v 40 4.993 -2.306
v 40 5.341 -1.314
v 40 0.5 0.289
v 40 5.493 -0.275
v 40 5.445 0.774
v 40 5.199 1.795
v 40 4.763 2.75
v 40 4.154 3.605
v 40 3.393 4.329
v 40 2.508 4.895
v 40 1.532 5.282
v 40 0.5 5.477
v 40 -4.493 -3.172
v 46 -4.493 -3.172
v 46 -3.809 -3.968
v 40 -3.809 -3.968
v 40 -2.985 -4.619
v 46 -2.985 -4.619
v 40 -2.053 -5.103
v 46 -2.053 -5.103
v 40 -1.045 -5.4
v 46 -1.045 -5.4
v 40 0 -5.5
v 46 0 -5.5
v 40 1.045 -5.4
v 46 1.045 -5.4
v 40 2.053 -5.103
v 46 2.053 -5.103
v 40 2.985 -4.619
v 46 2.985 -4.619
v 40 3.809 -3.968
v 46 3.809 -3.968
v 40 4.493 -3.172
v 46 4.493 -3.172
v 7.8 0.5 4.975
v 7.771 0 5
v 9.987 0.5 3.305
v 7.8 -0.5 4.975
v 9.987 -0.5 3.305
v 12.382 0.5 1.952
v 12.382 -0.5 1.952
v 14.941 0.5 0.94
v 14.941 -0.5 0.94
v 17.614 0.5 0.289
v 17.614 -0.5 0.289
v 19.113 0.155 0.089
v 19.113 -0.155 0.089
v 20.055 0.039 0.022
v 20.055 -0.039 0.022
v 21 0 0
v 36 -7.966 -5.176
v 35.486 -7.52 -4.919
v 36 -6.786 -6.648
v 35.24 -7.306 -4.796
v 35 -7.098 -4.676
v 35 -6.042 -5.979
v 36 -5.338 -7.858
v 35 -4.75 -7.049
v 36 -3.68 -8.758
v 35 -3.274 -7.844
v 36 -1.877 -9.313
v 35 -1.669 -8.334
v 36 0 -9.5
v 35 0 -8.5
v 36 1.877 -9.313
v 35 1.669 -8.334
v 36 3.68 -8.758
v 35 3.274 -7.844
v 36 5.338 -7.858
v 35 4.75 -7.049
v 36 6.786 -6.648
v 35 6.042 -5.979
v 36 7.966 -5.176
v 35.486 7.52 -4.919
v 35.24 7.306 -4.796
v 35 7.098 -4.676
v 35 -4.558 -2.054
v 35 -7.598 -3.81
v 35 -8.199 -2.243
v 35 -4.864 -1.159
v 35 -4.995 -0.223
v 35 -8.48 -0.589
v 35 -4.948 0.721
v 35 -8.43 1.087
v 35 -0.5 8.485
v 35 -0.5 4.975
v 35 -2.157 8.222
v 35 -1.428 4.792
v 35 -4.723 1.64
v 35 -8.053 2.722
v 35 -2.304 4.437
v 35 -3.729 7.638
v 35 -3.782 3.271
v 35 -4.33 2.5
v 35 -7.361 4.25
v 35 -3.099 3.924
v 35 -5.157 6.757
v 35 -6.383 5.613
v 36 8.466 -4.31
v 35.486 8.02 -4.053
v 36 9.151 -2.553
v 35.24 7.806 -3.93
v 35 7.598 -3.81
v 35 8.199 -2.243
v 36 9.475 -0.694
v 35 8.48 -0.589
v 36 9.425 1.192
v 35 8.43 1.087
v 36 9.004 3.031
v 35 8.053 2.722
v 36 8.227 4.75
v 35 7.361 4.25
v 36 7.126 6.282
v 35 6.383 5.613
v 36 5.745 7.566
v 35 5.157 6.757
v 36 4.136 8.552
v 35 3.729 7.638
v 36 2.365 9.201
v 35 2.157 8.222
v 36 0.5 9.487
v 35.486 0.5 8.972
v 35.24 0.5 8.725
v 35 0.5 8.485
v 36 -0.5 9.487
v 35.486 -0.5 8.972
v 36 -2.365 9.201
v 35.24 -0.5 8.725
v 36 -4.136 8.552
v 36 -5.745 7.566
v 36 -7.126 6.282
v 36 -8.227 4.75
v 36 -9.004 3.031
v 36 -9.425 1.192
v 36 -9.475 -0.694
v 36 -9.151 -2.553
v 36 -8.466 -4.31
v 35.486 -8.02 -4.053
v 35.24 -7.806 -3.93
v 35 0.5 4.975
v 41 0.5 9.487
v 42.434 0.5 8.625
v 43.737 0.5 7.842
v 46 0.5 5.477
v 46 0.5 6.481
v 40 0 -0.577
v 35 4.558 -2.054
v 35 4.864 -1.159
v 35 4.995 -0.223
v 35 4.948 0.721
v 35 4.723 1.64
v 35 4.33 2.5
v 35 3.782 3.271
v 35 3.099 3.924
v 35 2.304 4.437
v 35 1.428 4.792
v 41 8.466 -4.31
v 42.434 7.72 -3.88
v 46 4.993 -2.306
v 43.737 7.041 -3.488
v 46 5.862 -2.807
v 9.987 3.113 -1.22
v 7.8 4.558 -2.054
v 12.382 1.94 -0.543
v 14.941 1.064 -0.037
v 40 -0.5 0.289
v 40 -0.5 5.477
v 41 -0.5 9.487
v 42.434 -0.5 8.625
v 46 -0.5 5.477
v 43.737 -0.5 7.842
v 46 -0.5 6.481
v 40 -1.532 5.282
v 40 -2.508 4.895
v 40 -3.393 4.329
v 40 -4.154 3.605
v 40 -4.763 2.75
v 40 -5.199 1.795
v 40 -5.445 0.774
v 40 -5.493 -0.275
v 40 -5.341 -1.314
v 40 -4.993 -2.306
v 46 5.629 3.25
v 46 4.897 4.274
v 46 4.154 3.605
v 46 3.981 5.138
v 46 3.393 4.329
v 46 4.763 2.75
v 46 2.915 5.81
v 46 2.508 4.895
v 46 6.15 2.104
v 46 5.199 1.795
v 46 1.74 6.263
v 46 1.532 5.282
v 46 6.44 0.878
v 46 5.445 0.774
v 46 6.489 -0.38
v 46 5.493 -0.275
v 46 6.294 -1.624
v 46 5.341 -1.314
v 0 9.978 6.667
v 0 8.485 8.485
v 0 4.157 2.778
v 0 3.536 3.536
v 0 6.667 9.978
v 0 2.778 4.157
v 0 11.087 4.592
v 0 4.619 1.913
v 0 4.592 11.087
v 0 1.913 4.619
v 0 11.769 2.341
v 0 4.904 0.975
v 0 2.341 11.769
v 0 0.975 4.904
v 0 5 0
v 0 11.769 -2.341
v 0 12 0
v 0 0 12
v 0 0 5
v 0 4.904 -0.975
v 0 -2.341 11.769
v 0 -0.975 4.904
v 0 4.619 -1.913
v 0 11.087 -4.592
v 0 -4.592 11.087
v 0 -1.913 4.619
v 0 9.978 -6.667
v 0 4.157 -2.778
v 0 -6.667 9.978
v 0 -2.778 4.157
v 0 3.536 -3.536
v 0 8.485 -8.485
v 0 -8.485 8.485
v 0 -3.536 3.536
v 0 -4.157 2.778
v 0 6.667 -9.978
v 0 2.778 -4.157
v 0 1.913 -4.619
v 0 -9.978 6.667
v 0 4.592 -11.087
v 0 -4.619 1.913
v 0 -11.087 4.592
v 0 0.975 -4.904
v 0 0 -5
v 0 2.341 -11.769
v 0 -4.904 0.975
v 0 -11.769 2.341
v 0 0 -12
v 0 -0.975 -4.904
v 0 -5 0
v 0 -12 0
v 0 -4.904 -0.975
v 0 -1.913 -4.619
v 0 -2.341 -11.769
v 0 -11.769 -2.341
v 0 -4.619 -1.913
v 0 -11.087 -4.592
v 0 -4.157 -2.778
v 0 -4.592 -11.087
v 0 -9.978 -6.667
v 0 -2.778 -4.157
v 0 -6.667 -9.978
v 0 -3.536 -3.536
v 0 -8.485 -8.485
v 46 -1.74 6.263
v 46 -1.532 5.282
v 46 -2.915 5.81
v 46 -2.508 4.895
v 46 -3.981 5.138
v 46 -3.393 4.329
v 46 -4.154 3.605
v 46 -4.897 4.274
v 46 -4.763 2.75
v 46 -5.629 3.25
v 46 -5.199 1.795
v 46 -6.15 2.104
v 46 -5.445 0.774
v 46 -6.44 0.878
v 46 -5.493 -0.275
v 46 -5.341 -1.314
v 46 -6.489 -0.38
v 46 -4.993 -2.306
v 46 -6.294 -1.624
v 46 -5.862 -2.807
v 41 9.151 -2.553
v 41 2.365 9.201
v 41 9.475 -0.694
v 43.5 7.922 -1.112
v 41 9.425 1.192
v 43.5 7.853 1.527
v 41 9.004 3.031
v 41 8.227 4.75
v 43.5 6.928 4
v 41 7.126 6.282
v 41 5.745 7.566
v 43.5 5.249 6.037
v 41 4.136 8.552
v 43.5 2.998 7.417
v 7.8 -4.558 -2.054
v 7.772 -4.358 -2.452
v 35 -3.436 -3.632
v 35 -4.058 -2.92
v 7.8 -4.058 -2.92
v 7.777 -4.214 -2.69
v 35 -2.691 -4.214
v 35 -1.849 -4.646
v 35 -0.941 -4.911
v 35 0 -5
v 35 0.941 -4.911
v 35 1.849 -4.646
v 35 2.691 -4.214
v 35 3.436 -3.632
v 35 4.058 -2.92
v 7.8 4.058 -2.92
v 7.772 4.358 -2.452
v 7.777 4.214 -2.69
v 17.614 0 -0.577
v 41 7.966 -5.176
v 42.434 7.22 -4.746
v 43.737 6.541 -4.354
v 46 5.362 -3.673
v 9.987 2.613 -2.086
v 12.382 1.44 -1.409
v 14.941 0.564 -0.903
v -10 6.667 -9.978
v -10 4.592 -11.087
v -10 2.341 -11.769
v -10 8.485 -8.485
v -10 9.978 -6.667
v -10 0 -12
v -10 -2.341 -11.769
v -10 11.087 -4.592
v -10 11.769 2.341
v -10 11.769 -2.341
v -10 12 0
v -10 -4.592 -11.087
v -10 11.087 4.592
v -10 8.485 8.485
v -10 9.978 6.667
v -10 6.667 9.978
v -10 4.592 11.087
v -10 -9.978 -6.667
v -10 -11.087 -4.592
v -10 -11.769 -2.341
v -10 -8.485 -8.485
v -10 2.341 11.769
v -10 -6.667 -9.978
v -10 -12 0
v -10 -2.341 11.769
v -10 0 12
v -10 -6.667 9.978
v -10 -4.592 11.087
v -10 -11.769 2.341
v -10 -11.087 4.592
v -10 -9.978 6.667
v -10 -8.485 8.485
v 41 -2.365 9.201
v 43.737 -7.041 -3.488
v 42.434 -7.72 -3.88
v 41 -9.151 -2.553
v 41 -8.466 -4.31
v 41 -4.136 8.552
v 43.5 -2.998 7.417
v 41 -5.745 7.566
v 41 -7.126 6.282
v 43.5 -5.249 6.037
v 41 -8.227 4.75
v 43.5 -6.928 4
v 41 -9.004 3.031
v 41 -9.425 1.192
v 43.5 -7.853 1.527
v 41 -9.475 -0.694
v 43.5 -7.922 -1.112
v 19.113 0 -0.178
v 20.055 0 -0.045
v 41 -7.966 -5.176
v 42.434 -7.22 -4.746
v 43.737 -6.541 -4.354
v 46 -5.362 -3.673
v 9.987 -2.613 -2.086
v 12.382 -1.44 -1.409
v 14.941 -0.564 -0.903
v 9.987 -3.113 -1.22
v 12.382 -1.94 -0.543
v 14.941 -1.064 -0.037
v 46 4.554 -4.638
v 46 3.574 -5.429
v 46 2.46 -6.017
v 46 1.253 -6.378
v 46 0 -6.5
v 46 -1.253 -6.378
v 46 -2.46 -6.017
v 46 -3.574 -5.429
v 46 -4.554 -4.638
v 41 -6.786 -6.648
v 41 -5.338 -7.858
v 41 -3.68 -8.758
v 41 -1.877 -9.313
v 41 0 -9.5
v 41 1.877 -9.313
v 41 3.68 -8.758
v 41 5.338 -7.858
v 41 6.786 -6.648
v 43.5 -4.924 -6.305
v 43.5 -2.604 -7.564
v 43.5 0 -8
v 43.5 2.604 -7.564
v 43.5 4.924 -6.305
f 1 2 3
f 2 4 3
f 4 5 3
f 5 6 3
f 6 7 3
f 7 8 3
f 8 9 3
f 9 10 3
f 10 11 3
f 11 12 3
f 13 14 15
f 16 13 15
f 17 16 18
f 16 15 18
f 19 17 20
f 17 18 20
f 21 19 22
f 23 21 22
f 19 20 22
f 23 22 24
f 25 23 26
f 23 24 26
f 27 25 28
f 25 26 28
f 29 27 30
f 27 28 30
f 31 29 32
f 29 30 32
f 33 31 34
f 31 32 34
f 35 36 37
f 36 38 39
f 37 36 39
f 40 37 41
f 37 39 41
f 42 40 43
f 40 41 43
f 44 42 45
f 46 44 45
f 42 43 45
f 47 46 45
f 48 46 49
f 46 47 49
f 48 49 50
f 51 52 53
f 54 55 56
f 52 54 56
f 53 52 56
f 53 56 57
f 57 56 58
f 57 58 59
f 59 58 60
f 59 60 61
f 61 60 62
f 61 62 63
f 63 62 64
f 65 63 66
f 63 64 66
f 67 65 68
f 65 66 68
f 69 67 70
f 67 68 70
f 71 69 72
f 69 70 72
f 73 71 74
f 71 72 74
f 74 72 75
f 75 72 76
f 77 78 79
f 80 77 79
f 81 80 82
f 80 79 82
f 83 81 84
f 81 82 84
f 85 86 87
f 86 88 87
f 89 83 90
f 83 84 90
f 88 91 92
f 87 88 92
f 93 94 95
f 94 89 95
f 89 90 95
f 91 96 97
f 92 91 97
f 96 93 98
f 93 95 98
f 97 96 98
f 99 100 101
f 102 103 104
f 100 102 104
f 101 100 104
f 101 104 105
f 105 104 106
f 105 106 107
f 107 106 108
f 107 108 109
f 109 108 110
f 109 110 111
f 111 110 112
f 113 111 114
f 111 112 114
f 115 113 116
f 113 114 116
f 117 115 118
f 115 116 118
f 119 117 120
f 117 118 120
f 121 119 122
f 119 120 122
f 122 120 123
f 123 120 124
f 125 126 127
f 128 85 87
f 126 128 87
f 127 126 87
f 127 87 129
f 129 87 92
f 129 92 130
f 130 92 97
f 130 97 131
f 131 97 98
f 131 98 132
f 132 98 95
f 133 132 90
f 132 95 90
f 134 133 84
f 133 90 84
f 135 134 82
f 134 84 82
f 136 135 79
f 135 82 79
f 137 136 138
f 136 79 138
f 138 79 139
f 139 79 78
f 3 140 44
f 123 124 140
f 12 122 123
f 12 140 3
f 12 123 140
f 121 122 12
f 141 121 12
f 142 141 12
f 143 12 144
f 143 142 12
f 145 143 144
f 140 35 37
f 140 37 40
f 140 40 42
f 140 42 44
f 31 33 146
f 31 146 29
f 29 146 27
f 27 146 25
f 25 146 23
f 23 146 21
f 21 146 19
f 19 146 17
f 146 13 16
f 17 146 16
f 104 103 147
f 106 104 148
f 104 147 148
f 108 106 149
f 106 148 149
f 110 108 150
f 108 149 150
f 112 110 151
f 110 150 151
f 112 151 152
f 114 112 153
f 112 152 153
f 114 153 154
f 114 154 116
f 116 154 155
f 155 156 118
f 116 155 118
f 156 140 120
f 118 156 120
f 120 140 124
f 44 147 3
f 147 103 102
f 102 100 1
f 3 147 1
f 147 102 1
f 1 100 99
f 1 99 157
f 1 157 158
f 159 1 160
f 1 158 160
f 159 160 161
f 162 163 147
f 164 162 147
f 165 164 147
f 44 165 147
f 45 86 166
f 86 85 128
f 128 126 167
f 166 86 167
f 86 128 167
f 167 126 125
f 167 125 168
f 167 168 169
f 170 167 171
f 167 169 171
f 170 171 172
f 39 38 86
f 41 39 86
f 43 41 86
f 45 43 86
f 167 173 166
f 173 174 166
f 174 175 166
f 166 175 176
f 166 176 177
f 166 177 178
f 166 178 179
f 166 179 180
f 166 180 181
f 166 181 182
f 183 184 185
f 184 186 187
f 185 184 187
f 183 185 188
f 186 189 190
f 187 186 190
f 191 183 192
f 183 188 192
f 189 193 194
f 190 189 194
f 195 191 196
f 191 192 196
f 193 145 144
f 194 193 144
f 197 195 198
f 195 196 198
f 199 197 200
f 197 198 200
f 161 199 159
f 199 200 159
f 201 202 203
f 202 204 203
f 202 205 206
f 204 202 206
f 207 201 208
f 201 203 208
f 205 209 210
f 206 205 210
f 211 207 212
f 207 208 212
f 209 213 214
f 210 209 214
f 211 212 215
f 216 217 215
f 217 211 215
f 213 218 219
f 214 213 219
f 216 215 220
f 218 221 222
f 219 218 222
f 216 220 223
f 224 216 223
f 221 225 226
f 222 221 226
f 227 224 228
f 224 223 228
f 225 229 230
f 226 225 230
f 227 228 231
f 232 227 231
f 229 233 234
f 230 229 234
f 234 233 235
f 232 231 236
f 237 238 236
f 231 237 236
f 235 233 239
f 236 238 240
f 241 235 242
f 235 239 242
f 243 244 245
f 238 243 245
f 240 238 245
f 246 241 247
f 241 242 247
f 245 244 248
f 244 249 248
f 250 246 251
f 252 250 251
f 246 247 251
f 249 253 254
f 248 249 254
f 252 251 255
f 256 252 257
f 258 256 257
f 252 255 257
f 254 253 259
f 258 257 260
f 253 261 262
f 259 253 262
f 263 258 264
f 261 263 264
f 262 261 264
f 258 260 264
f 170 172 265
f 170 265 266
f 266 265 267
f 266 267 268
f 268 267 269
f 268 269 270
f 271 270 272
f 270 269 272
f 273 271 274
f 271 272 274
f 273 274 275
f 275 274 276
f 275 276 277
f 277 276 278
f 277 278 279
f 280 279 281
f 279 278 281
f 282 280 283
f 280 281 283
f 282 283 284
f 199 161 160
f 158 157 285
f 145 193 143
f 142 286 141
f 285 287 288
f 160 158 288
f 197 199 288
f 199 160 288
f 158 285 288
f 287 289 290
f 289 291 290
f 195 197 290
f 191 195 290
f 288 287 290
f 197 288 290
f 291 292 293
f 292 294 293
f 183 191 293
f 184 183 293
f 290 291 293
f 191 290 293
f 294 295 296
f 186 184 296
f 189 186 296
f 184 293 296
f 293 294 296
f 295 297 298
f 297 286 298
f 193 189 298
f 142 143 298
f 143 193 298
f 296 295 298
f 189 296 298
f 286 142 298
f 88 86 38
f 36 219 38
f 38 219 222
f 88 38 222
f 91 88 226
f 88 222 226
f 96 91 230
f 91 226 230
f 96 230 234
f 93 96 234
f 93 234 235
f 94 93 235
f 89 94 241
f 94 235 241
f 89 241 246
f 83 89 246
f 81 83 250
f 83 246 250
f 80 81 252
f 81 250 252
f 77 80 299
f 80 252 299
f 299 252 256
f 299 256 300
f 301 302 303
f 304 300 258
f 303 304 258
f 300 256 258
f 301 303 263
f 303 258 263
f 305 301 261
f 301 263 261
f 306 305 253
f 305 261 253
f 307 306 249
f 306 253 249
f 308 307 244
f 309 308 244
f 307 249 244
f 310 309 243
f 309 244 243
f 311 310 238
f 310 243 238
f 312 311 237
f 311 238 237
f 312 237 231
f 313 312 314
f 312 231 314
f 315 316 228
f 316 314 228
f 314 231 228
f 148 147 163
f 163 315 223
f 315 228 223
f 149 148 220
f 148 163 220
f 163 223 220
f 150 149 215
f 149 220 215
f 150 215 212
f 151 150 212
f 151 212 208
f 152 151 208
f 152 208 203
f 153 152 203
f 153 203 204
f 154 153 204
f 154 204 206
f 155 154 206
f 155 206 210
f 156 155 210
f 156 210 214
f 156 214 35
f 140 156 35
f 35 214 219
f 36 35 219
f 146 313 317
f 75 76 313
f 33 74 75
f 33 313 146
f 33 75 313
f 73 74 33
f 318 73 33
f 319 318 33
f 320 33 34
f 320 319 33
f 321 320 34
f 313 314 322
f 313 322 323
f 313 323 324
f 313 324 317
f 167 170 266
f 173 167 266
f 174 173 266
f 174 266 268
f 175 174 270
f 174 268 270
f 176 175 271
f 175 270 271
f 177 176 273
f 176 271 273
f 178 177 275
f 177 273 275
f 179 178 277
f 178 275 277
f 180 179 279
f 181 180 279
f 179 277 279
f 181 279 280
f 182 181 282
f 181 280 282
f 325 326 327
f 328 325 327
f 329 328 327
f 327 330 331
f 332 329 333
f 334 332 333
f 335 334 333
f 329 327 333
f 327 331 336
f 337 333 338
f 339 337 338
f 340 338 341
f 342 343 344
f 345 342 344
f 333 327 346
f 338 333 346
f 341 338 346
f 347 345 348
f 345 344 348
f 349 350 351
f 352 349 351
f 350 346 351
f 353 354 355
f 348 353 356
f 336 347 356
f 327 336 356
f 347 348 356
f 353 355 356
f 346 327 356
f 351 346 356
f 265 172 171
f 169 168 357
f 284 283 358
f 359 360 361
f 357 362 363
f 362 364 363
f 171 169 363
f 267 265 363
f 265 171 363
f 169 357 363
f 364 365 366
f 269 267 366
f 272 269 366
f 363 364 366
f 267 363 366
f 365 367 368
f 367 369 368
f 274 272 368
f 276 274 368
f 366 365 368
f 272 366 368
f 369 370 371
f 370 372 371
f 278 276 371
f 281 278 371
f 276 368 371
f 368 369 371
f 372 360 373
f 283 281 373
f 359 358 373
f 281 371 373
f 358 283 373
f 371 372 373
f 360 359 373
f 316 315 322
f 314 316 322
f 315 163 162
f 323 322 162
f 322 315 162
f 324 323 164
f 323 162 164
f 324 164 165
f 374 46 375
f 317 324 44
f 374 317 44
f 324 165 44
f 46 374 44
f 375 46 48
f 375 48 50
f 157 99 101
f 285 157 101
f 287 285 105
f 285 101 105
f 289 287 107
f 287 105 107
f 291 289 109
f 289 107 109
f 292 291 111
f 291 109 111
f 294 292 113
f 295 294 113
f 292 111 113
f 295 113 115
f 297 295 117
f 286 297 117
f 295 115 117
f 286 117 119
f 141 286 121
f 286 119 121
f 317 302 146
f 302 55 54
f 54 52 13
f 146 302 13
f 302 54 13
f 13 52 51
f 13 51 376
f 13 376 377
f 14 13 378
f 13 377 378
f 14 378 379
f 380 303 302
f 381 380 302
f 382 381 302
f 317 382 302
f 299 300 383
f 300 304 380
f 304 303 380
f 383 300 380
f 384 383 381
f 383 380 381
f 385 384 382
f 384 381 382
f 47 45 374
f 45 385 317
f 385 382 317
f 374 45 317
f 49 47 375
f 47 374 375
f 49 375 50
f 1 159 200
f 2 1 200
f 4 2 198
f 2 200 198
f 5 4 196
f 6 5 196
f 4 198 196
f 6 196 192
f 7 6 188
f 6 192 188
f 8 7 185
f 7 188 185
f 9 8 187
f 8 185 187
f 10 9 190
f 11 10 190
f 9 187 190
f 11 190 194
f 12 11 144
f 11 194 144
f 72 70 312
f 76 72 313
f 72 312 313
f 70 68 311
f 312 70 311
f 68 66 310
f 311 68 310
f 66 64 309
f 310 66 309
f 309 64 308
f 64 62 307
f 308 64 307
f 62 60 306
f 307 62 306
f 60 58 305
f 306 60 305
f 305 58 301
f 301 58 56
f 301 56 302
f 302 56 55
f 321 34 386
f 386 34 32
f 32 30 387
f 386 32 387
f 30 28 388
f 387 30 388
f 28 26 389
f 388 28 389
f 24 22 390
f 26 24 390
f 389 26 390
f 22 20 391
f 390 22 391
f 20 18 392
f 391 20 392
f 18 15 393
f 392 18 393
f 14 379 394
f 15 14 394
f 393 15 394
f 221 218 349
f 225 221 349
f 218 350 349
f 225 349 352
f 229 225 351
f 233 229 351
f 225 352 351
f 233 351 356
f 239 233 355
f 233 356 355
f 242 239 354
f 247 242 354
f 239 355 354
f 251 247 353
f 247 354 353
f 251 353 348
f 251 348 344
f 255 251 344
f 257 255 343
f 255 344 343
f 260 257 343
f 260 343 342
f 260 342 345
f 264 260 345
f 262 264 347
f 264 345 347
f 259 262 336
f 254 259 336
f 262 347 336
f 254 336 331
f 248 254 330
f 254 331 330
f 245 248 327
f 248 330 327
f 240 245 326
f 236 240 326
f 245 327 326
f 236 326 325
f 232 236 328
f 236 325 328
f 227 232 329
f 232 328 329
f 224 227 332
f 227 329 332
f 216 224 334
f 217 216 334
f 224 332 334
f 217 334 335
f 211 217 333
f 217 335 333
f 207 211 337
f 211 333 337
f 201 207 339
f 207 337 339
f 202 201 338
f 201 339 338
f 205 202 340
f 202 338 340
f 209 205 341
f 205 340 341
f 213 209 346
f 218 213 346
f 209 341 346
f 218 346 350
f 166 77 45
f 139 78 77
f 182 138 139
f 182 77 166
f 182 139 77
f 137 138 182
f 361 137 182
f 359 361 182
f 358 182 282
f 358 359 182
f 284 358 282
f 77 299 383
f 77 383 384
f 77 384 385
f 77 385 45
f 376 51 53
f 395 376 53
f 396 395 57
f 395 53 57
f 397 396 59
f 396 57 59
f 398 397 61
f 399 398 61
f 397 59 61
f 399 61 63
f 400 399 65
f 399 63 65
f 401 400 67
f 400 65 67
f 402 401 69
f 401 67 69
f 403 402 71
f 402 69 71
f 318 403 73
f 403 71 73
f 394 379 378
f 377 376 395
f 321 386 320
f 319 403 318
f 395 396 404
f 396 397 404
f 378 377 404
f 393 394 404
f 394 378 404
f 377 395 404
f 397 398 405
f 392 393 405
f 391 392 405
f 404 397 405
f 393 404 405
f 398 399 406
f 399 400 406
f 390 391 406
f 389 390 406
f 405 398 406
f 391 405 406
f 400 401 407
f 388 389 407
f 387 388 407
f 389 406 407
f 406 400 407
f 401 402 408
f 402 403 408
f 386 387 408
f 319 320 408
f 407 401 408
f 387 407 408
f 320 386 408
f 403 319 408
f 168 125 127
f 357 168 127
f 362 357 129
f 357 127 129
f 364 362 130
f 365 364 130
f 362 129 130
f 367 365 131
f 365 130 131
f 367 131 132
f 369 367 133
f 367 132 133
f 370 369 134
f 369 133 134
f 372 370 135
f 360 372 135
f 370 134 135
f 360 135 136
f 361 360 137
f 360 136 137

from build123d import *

# Parameters (mm, degrees)
F2_SIZE  = 1
F4_DEPTH = 0.5
F5_COUNT = 3


with BuildPart() as f1:
    # F0 (on Front) → F1 (revolve)
    with BuildSketch(Plane.XZ):
        Polygon((35, 5), (0, 5), (0, 12), (-10, 12), (-10, 0), (0, 0), (40, 0), (40, 5.5), (46, 5.5), (46, 6.5), (41, 9.5), (35, 9.5), align=None)
    revolve(axis=Axis((23.443235, 0, 0), (1, 0, 0)))

    # F2
    f2_edges = [f1.edges().sort_by_distance(p)[0] for p in [
        (35, 0, -9.5),
    ]]
    chamfer(f2_edges, length=F2_SIZE)


with BuildPart() as f4:
    # F3 (on Front) → F4 (new body, symmetric)
    with BuildSketch(Plane.XZ):
        with BuildLine():
            Line((55.388199, 40), (21, 40))
            ThreePointArc((21, 40), (1, 20), (21, 0))
            Line((21, 0), (55.388199, 0))
            Line((55.388199, 0), (55.388199, 40))
        make_face()
    extrude(amount=F4_DEPTH, both=True)


with BuildPart() as f5_1:
    # F5: instance of F4
    add(f4.part.rotate(Axis((62.455053, 0, 0), (1, 0, 0)), 1 * 360 / F5_COUNT))


with BuildPart() as f5_2:
    # F5: instance of F4
    add(f4.part.rotate(Axis((62.455053, 0, 0), (1, 0, 0)), 2 * 360 / F5_COUNT))


with BuildPart() as f1_1:
    add(f1.part)

    # F6: cut F4, F5_1, F5_2
    add(f4.part, mode=Mode.SUBTRACT)
    add(f5_1.part, mode=Mode.SUBTRACT)
    add(f5_2.part, mode=Mode.SUBTRACT)


solid = f1_1.part
